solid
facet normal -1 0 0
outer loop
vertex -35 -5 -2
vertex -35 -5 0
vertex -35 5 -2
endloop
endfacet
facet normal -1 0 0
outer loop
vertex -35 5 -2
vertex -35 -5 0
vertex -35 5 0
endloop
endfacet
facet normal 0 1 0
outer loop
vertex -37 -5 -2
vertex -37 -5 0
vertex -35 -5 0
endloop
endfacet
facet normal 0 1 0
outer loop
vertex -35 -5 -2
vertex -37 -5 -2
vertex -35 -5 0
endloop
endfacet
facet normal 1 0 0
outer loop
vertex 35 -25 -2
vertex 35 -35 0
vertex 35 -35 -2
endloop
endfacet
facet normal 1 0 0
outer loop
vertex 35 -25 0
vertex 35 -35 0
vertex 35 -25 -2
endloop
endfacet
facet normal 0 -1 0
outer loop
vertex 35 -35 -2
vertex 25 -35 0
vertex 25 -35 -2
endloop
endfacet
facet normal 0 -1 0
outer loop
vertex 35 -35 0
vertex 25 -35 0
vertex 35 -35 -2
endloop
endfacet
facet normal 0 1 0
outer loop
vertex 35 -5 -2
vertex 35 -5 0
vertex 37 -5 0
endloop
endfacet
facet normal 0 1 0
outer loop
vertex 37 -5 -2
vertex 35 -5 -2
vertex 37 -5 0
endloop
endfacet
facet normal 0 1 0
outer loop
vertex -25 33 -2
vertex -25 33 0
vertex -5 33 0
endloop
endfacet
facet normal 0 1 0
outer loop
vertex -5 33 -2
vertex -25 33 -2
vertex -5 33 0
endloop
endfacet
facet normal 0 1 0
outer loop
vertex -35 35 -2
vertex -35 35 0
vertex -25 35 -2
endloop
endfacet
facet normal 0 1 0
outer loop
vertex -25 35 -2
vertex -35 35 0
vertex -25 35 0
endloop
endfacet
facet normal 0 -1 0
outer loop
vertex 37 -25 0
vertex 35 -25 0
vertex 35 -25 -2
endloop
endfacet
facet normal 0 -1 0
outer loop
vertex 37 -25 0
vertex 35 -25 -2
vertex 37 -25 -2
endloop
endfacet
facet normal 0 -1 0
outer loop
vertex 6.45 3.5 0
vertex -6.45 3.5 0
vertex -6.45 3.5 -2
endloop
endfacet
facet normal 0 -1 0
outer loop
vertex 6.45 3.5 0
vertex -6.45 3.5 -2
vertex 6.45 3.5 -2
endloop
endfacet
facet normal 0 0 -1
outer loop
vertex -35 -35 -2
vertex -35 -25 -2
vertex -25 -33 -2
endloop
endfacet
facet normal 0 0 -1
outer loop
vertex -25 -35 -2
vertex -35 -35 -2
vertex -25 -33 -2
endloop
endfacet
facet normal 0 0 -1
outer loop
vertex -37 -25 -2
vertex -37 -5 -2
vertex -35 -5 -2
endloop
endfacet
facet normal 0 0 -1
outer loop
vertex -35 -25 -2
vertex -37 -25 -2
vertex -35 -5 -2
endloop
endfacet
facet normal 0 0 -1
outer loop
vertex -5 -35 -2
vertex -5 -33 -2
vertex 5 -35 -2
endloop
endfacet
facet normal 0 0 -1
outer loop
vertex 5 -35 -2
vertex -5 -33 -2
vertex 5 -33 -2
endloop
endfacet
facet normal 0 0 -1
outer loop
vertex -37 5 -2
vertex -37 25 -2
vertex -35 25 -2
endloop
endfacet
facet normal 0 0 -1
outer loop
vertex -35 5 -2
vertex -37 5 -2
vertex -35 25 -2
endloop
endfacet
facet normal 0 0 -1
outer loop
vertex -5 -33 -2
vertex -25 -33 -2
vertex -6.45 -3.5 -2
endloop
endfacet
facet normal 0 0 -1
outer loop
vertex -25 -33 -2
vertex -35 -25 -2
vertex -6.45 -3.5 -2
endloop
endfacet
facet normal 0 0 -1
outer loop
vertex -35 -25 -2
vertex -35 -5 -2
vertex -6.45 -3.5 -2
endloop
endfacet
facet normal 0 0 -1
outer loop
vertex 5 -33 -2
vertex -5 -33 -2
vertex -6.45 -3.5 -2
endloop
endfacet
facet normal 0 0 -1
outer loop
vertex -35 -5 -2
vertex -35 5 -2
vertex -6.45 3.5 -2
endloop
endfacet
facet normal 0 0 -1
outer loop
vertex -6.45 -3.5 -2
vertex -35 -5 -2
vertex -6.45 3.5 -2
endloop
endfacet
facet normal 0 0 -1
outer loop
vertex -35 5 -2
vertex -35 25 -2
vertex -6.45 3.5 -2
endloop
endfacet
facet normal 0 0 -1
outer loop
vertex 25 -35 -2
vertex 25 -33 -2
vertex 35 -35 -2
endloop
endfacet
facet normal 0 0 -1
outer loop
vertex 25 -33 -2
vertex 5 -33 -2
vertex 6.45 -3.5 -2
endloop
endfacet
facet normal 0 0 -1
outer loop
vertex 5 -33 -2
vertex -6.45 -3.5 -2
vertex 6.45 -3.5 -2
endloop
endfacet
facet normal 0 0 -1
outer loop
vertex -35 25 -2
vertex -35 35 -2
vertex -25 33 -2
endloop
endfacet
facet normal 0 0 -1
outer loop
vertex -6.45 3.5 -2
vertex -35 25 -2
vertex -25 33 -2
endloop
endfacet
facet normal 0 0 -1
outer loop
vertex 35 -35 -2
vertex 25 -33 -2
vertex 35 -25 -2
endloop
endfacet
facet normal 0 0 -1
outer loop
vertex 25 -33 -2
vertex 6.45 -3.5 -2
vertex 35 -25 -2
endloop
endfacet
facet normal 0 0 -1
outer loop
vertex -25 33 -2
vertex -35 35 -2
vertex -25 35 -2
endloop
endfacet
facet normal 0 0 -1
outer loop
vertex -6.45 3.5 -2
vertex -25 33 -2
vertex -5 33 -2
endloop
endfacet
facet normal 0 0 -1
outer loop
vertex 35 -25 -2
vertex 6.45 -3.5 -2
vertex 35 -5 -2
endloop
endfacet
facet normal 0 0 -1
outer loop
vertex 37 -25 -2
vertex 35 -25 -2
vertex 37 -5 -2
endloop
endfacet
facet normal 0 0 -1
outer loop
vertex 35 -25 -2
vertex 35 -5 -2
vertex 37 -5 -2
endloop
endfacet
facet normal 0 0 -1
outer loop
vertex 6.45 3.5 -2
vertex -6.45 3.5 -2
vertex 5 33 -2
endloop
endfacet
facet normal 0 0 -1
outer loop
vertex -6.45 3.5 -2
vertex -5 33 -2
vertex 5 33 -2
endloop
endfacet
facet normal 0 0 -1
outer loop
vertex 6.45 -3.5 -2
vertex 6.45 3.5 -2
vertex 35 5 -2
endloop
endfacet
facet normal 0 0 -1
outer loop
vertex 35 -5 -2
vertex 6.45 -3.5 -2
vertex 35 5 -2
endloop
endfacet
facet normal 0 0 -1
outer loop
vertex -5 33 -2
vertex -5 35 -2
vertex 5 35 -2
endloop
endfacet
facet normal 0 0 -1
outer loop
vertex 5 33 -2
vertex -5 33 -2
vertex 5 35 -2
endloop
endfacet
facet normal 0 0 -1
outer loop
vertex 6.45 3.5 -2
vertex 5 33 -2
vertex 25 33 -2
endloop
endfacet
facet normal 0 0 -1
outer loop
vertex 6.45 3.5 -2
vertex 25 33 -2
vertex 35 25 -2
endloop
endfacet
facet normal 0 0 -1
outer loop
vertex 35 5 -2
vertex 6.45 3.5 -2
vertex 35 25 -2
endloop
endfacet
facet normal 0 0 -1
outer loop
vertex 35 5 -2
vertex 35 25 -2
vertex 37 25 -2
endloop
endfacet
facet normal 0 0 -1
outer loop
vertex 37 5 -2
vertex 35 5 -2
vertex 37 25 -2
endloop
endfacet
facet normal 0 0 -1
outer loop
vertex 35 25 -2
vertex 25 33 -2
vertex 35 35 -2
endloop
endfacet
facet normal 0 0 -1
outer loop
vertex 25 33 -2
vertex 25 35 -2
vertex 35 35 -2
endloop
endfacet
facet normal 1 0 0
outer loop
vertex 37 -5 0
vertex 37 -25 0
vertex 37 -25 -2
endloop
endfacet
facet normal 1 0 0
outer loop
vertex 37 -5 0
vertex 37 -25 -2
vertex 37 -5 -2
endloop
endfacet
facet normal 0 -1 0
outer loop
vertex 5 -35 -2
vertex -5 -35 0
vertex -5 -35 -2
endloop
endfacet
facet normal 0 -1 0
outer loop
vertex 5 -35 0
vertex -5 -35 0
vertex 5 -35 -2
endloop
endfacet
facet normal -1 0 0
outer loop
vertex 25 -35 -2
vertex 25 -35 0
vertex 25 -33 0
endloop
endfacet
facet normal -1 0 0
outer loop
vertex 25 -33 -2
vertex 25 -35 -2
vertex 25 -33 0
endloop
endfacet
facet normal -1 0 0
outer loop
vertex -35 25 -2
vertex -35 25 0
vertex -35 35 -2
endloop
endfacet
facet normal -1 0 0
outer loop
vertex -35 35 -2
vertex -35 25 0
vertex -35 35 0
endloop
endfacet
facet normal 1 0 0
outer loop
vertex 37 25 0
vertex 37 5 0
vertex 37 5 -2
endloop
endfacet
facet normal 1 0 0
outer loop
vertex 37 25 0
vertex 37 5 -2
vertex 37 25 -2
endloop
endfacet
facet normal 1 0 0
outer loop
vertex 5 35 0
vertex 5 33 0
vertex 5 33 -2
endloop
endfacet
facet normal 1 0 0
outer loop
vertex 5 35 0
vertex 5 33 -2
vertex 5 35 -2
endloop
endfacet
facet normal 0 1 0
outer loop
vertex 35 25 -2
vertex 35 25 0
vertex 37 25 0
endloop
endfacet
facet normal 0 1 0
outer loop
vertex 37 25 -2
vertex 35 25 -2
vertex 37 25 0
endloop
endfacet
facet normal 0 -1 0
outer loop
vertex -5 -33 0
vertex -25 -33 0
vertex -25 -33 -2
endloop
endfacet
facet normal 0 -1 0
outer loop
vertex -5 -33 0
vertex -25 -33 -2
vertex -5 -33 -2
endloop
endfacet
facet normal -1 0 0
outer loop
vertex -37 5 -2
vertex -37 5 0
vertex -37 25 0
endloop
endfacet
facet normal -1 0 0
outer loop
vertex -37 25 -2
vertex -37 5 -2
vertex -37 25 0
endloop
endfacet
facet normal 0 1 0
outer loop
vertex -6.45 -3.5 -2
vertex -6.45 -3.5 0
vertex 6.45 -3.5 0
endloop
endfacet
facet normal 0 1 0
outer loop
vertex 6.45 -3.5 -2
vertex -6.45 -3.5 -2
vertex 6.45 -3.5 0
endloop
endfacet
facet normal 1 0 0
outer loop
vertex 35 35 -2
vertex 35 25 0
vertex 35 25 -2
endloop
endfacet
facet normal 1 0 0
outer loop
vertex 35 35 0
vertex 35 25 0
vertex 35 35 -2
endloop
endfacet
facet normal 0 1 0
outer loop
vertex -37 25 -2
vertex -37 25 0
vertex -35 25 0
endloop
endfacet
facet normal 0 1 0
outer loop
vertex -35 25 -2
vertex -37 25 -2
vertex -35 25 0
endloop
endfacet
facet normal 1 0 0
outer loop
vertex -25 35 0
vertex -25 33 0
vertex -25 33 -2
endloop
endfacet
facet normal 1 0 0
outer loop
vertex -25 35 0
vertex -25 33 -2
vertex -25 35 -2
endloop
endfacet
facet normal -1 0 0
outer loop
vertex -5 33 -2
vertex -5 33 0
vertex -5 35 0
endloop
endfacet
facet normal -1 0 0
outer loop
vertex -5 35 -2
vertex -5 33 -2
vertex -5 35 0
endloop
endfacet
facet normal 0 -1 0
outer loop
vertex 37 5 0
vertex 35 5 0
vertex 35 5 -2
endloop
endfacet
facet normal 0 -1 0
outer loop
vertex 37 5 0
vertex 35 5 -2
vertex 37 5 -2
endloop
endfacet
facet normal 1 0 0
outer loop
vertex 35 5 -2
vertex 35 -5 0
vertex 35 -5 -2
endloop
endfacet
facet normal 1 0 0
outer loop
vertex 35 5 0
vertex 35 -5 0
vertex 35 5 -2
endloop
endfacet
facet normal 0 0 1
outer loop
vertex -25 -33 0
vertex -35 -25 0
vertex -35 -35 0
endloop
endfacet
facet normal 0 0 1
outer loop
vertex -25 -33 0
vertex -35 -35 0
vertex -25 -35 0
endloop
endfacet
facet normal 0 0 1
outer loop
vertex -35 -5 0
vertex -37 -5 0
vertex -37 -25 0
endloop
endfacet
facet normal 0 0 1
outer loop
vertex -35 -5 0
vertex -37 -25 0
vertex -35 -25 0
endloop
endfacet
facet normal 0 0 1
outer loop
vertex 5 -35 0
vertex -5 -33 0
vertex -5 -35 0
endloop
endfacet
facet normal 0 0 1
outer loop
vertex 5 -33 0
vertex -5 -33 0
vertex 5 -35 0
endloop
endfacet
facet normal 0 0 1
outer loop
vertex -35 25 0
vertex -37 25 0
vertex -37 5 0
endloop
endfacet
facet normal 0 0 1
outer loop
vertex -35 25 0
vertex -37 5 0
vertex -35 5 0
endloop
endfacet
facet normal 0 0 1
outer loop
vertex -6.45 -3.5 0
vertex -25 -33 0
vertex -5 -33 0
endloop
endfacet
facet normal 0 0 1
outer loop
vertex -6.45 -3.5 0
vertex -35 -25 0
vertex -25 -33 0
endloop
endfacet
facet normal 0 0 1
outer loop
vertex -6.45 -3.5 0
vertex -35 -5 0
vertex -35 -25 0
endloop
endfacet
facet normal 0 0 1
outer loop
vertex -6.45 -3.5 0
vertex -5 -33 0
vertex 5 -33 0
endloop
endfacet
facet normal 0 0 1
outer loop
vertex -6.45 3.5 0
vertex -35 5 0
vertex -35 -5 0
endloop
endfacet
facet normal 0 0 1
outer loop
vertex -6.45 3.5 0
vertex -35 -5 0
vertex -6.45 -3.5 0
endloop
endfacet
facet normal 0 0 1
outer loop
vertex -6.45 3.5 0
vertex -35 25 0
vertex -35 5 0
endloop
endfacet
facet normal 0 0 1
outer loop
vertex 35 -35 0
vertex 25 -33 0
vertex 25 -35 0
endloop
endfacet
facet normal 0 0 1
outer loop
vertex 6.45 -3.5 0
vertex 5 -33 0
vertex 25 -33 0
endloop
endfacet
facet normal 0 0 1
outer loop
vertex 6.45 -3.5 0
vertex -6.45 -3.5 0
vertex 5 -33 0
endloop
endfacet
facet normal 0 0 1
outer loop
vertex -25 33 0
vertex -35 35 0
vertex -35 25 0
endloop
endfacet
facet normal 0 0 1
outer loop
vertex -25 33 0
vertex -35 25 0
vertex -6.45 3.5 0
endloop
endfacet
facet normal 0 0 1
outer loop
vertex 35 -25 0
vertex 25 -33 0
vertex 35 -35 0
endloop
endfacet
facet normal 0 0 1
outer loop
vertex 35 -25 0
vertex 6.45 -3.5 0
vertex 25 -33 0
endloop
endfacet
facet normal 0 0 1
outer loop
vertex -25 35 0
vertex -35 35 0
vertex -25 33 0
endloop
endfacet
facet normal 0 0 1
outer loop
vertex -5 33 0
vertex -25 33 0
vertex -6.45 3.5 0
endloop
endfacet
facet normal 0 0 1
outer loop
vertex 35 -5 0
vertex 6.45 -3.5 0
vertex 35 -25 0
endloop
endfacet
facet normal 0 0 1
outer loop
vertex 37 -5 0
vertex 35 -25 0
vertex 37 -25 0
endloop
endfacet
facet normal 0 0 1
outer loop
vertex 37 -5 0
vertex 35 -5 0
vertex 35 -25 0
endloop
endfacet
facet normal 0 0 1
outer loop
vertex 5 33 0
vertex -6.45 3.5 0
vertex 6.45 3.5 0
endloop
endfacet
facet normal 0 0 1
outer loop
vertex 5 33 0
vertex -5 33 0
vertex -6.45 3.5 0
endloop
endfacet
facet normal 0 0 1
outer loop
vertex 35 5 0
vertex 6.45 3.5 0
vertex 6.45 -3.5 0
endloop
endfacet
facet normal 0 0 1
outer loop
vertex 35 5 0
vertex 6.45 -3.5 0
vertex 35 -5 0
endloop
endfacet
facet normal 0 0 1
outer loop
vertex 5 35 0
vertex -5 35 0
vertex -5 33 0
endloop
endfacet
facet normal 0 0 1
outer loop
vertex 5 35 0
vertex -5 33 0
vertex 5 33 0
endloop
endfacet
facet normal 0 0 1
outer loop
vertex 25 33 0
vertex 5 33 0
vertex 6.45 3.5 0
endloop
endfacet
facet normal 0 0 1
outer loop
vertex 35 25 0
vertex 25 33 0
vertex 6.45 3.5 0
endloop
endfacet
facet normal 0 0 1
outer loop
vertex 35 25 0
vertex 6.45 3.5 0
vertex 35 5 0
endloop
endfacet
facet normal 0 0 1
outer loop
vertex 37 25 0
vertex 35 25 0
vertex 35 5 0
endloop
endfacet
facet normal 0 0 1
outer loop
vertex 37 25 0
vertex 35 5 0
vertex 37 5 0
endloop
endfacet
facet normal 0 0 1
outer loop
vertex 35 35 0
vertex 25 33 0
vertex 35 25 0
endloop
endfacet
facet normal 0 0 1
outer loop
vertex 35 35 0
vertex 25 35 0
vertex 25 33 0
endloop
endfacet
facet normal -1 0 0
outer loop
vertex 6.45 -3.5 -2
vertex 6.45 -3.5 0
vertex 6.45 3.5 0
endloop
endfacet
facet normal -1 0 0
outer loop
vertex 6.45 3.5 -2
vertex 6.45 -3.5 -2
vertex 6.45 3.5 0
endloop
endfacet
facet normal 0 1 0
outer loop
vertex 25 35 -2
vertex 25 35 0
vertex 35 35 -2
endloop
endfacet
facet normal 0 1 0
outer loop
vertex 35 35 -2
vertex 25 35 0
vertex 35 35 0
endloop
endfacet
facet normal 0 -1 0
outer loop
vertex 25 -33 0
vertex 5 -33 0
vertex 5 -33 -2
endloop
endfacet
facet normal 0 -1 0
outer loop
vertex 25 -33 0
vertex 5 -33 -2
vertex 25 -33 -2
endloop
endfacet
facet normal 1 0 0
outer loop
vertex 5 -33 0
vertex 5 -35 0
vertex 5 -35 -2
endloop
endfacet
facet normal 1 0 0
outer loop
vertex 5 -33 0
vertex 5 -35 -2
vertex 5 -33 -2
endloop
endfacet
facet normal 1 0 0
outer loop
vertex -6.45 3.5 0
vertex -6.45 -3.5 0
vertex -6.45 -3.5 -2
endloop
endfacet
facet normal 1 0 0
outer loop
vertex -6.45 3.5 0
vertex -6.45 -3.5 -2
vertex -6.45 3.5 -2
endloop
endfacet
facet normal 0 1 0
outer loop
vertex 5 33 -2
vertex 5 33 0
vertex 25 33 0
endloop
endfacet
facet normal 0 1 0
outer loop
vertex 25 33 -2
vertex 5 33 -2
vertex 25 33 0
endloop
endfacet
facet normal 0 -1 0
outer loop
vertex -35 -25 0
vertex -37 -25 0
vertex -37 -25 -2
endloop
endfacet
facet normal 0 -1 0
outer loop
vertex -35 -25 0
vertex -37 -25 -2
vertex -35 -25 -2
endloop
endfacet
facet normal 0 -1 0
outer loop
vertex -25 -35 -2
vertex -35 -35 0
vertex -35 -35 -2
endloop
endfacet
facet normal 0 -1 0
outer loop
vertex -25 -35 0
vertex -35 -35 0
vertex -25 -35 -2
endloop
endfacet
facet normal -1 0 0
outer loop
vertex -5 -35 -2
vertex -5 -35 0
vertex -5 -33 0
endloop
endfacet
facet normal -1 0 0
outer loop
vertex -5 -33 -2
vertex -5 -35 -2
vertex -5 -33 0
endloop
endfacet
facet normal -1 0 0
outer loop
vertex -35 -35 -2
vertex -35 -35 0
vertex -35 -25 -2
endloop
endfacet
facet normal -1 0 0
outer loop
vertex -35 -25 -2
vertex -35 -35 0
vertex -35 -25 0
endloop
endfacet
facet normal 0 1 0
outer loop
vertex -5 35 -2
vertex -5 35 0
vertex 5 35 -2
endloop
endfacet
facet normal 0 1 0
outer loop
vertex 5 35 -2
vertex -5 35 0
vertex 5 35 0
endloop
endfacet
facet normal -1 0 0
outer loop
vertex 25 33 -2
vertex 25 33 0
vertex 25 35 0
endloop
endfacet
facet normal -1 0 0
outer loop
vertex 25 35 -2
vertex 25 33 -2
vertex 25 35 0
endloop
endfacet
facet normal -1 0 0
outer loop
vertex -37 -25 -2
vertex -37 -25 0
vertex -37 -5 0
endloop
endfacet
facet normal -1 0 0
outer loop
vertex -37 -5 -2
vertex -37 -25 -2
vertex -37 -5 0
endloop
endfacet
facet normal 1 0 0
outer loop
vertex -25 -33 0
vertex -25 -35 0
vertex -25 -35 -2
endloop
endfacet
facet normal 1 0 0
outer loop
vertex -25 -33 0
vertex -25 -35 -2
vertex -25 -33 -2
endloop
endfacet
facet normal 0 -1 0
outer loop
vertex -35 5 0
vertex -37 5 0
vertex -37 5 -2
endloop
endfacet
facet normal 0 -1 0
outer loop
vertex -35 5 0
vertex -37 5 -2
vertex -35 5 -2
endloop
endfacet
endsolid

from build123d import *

# Parameters (mm, degrees)
SKETCH1_W           = 70
SKETCH1_H           = 70
BOSS_EXTRUDE1_DEPTH = 2
SKETCH2_W           = 2
SKETCH2_H           = 20
BOSS_EXTRUDE2_DEPTH = 2
SKETCH3_W           = 20
SKETCH3_H           = 2
CUT_EXTRUDE1_DEPTH  = 2
SKETCH4_W           = 12.9
SKETCH4_H           = 7
CUT_EXTRUDE2_DEPTH  = 10


with BuildPart() as part:
    # Sketch1 → Boss-Extrude1 (new body)
    with BuildSketch(Plane.XY):
        Rectangle(SKETCH1_W, SKETCH1_H)
    extrude(amount=-BOSS_EXTRUDE1_DEPTH)

    # Sketch2 → Boss-Extrude2 (add)
    with BuildSketch(Plane.XY):
        with Locations((-36, 15)):
            Rectangle(SKETCH2_W, SKETCH2_H)
        with Locations((-36, -15)):
            Rectangle(SKETCH2_W, SKETCH2_H)
        with Locations((36, -15)):
            Rectangle(SKETCH2_W, SKETCH2_H)
        with Locations((36, 15)):
            Rectangle(SKETCH2_W, SKETCH2_H)
    extrude(amount=-BOSS_EXTRUDE2_DEPTH)

    # Sketch3 → Cut-Extrude1 (cut)
    with BuildSketch(Plane.XY):
        with Locations((-15, 34)):
            Rectangle(SKETCH3_W, SKETCH3_H)
        with Locations((15, 34)):
            Rectangle(SKETCH3_W, SKETCH3_H)
        with Locations((-15, -34)):
            Rectangle(SKETCH3_W, SKETCH3_H)
        with Locations((15, -34)):
            Rectangle(SKETCH3_W, SKETCH3_H)
    extrude(amount=-CUT_EXTRUDE1_DEPTH, mode=Mode.SUBTRACT)

    # Sketch4 → Cut-Extrude2 (cut)
    with BuildSketch(Plane.XY):
        Rectangle(SKETCH4_W, SKETCH4_H)
    extrude(amount=-CUT_EXTRUDE2_DEPTH, mode=Mode.SUBTRACT)


solid = part.part
